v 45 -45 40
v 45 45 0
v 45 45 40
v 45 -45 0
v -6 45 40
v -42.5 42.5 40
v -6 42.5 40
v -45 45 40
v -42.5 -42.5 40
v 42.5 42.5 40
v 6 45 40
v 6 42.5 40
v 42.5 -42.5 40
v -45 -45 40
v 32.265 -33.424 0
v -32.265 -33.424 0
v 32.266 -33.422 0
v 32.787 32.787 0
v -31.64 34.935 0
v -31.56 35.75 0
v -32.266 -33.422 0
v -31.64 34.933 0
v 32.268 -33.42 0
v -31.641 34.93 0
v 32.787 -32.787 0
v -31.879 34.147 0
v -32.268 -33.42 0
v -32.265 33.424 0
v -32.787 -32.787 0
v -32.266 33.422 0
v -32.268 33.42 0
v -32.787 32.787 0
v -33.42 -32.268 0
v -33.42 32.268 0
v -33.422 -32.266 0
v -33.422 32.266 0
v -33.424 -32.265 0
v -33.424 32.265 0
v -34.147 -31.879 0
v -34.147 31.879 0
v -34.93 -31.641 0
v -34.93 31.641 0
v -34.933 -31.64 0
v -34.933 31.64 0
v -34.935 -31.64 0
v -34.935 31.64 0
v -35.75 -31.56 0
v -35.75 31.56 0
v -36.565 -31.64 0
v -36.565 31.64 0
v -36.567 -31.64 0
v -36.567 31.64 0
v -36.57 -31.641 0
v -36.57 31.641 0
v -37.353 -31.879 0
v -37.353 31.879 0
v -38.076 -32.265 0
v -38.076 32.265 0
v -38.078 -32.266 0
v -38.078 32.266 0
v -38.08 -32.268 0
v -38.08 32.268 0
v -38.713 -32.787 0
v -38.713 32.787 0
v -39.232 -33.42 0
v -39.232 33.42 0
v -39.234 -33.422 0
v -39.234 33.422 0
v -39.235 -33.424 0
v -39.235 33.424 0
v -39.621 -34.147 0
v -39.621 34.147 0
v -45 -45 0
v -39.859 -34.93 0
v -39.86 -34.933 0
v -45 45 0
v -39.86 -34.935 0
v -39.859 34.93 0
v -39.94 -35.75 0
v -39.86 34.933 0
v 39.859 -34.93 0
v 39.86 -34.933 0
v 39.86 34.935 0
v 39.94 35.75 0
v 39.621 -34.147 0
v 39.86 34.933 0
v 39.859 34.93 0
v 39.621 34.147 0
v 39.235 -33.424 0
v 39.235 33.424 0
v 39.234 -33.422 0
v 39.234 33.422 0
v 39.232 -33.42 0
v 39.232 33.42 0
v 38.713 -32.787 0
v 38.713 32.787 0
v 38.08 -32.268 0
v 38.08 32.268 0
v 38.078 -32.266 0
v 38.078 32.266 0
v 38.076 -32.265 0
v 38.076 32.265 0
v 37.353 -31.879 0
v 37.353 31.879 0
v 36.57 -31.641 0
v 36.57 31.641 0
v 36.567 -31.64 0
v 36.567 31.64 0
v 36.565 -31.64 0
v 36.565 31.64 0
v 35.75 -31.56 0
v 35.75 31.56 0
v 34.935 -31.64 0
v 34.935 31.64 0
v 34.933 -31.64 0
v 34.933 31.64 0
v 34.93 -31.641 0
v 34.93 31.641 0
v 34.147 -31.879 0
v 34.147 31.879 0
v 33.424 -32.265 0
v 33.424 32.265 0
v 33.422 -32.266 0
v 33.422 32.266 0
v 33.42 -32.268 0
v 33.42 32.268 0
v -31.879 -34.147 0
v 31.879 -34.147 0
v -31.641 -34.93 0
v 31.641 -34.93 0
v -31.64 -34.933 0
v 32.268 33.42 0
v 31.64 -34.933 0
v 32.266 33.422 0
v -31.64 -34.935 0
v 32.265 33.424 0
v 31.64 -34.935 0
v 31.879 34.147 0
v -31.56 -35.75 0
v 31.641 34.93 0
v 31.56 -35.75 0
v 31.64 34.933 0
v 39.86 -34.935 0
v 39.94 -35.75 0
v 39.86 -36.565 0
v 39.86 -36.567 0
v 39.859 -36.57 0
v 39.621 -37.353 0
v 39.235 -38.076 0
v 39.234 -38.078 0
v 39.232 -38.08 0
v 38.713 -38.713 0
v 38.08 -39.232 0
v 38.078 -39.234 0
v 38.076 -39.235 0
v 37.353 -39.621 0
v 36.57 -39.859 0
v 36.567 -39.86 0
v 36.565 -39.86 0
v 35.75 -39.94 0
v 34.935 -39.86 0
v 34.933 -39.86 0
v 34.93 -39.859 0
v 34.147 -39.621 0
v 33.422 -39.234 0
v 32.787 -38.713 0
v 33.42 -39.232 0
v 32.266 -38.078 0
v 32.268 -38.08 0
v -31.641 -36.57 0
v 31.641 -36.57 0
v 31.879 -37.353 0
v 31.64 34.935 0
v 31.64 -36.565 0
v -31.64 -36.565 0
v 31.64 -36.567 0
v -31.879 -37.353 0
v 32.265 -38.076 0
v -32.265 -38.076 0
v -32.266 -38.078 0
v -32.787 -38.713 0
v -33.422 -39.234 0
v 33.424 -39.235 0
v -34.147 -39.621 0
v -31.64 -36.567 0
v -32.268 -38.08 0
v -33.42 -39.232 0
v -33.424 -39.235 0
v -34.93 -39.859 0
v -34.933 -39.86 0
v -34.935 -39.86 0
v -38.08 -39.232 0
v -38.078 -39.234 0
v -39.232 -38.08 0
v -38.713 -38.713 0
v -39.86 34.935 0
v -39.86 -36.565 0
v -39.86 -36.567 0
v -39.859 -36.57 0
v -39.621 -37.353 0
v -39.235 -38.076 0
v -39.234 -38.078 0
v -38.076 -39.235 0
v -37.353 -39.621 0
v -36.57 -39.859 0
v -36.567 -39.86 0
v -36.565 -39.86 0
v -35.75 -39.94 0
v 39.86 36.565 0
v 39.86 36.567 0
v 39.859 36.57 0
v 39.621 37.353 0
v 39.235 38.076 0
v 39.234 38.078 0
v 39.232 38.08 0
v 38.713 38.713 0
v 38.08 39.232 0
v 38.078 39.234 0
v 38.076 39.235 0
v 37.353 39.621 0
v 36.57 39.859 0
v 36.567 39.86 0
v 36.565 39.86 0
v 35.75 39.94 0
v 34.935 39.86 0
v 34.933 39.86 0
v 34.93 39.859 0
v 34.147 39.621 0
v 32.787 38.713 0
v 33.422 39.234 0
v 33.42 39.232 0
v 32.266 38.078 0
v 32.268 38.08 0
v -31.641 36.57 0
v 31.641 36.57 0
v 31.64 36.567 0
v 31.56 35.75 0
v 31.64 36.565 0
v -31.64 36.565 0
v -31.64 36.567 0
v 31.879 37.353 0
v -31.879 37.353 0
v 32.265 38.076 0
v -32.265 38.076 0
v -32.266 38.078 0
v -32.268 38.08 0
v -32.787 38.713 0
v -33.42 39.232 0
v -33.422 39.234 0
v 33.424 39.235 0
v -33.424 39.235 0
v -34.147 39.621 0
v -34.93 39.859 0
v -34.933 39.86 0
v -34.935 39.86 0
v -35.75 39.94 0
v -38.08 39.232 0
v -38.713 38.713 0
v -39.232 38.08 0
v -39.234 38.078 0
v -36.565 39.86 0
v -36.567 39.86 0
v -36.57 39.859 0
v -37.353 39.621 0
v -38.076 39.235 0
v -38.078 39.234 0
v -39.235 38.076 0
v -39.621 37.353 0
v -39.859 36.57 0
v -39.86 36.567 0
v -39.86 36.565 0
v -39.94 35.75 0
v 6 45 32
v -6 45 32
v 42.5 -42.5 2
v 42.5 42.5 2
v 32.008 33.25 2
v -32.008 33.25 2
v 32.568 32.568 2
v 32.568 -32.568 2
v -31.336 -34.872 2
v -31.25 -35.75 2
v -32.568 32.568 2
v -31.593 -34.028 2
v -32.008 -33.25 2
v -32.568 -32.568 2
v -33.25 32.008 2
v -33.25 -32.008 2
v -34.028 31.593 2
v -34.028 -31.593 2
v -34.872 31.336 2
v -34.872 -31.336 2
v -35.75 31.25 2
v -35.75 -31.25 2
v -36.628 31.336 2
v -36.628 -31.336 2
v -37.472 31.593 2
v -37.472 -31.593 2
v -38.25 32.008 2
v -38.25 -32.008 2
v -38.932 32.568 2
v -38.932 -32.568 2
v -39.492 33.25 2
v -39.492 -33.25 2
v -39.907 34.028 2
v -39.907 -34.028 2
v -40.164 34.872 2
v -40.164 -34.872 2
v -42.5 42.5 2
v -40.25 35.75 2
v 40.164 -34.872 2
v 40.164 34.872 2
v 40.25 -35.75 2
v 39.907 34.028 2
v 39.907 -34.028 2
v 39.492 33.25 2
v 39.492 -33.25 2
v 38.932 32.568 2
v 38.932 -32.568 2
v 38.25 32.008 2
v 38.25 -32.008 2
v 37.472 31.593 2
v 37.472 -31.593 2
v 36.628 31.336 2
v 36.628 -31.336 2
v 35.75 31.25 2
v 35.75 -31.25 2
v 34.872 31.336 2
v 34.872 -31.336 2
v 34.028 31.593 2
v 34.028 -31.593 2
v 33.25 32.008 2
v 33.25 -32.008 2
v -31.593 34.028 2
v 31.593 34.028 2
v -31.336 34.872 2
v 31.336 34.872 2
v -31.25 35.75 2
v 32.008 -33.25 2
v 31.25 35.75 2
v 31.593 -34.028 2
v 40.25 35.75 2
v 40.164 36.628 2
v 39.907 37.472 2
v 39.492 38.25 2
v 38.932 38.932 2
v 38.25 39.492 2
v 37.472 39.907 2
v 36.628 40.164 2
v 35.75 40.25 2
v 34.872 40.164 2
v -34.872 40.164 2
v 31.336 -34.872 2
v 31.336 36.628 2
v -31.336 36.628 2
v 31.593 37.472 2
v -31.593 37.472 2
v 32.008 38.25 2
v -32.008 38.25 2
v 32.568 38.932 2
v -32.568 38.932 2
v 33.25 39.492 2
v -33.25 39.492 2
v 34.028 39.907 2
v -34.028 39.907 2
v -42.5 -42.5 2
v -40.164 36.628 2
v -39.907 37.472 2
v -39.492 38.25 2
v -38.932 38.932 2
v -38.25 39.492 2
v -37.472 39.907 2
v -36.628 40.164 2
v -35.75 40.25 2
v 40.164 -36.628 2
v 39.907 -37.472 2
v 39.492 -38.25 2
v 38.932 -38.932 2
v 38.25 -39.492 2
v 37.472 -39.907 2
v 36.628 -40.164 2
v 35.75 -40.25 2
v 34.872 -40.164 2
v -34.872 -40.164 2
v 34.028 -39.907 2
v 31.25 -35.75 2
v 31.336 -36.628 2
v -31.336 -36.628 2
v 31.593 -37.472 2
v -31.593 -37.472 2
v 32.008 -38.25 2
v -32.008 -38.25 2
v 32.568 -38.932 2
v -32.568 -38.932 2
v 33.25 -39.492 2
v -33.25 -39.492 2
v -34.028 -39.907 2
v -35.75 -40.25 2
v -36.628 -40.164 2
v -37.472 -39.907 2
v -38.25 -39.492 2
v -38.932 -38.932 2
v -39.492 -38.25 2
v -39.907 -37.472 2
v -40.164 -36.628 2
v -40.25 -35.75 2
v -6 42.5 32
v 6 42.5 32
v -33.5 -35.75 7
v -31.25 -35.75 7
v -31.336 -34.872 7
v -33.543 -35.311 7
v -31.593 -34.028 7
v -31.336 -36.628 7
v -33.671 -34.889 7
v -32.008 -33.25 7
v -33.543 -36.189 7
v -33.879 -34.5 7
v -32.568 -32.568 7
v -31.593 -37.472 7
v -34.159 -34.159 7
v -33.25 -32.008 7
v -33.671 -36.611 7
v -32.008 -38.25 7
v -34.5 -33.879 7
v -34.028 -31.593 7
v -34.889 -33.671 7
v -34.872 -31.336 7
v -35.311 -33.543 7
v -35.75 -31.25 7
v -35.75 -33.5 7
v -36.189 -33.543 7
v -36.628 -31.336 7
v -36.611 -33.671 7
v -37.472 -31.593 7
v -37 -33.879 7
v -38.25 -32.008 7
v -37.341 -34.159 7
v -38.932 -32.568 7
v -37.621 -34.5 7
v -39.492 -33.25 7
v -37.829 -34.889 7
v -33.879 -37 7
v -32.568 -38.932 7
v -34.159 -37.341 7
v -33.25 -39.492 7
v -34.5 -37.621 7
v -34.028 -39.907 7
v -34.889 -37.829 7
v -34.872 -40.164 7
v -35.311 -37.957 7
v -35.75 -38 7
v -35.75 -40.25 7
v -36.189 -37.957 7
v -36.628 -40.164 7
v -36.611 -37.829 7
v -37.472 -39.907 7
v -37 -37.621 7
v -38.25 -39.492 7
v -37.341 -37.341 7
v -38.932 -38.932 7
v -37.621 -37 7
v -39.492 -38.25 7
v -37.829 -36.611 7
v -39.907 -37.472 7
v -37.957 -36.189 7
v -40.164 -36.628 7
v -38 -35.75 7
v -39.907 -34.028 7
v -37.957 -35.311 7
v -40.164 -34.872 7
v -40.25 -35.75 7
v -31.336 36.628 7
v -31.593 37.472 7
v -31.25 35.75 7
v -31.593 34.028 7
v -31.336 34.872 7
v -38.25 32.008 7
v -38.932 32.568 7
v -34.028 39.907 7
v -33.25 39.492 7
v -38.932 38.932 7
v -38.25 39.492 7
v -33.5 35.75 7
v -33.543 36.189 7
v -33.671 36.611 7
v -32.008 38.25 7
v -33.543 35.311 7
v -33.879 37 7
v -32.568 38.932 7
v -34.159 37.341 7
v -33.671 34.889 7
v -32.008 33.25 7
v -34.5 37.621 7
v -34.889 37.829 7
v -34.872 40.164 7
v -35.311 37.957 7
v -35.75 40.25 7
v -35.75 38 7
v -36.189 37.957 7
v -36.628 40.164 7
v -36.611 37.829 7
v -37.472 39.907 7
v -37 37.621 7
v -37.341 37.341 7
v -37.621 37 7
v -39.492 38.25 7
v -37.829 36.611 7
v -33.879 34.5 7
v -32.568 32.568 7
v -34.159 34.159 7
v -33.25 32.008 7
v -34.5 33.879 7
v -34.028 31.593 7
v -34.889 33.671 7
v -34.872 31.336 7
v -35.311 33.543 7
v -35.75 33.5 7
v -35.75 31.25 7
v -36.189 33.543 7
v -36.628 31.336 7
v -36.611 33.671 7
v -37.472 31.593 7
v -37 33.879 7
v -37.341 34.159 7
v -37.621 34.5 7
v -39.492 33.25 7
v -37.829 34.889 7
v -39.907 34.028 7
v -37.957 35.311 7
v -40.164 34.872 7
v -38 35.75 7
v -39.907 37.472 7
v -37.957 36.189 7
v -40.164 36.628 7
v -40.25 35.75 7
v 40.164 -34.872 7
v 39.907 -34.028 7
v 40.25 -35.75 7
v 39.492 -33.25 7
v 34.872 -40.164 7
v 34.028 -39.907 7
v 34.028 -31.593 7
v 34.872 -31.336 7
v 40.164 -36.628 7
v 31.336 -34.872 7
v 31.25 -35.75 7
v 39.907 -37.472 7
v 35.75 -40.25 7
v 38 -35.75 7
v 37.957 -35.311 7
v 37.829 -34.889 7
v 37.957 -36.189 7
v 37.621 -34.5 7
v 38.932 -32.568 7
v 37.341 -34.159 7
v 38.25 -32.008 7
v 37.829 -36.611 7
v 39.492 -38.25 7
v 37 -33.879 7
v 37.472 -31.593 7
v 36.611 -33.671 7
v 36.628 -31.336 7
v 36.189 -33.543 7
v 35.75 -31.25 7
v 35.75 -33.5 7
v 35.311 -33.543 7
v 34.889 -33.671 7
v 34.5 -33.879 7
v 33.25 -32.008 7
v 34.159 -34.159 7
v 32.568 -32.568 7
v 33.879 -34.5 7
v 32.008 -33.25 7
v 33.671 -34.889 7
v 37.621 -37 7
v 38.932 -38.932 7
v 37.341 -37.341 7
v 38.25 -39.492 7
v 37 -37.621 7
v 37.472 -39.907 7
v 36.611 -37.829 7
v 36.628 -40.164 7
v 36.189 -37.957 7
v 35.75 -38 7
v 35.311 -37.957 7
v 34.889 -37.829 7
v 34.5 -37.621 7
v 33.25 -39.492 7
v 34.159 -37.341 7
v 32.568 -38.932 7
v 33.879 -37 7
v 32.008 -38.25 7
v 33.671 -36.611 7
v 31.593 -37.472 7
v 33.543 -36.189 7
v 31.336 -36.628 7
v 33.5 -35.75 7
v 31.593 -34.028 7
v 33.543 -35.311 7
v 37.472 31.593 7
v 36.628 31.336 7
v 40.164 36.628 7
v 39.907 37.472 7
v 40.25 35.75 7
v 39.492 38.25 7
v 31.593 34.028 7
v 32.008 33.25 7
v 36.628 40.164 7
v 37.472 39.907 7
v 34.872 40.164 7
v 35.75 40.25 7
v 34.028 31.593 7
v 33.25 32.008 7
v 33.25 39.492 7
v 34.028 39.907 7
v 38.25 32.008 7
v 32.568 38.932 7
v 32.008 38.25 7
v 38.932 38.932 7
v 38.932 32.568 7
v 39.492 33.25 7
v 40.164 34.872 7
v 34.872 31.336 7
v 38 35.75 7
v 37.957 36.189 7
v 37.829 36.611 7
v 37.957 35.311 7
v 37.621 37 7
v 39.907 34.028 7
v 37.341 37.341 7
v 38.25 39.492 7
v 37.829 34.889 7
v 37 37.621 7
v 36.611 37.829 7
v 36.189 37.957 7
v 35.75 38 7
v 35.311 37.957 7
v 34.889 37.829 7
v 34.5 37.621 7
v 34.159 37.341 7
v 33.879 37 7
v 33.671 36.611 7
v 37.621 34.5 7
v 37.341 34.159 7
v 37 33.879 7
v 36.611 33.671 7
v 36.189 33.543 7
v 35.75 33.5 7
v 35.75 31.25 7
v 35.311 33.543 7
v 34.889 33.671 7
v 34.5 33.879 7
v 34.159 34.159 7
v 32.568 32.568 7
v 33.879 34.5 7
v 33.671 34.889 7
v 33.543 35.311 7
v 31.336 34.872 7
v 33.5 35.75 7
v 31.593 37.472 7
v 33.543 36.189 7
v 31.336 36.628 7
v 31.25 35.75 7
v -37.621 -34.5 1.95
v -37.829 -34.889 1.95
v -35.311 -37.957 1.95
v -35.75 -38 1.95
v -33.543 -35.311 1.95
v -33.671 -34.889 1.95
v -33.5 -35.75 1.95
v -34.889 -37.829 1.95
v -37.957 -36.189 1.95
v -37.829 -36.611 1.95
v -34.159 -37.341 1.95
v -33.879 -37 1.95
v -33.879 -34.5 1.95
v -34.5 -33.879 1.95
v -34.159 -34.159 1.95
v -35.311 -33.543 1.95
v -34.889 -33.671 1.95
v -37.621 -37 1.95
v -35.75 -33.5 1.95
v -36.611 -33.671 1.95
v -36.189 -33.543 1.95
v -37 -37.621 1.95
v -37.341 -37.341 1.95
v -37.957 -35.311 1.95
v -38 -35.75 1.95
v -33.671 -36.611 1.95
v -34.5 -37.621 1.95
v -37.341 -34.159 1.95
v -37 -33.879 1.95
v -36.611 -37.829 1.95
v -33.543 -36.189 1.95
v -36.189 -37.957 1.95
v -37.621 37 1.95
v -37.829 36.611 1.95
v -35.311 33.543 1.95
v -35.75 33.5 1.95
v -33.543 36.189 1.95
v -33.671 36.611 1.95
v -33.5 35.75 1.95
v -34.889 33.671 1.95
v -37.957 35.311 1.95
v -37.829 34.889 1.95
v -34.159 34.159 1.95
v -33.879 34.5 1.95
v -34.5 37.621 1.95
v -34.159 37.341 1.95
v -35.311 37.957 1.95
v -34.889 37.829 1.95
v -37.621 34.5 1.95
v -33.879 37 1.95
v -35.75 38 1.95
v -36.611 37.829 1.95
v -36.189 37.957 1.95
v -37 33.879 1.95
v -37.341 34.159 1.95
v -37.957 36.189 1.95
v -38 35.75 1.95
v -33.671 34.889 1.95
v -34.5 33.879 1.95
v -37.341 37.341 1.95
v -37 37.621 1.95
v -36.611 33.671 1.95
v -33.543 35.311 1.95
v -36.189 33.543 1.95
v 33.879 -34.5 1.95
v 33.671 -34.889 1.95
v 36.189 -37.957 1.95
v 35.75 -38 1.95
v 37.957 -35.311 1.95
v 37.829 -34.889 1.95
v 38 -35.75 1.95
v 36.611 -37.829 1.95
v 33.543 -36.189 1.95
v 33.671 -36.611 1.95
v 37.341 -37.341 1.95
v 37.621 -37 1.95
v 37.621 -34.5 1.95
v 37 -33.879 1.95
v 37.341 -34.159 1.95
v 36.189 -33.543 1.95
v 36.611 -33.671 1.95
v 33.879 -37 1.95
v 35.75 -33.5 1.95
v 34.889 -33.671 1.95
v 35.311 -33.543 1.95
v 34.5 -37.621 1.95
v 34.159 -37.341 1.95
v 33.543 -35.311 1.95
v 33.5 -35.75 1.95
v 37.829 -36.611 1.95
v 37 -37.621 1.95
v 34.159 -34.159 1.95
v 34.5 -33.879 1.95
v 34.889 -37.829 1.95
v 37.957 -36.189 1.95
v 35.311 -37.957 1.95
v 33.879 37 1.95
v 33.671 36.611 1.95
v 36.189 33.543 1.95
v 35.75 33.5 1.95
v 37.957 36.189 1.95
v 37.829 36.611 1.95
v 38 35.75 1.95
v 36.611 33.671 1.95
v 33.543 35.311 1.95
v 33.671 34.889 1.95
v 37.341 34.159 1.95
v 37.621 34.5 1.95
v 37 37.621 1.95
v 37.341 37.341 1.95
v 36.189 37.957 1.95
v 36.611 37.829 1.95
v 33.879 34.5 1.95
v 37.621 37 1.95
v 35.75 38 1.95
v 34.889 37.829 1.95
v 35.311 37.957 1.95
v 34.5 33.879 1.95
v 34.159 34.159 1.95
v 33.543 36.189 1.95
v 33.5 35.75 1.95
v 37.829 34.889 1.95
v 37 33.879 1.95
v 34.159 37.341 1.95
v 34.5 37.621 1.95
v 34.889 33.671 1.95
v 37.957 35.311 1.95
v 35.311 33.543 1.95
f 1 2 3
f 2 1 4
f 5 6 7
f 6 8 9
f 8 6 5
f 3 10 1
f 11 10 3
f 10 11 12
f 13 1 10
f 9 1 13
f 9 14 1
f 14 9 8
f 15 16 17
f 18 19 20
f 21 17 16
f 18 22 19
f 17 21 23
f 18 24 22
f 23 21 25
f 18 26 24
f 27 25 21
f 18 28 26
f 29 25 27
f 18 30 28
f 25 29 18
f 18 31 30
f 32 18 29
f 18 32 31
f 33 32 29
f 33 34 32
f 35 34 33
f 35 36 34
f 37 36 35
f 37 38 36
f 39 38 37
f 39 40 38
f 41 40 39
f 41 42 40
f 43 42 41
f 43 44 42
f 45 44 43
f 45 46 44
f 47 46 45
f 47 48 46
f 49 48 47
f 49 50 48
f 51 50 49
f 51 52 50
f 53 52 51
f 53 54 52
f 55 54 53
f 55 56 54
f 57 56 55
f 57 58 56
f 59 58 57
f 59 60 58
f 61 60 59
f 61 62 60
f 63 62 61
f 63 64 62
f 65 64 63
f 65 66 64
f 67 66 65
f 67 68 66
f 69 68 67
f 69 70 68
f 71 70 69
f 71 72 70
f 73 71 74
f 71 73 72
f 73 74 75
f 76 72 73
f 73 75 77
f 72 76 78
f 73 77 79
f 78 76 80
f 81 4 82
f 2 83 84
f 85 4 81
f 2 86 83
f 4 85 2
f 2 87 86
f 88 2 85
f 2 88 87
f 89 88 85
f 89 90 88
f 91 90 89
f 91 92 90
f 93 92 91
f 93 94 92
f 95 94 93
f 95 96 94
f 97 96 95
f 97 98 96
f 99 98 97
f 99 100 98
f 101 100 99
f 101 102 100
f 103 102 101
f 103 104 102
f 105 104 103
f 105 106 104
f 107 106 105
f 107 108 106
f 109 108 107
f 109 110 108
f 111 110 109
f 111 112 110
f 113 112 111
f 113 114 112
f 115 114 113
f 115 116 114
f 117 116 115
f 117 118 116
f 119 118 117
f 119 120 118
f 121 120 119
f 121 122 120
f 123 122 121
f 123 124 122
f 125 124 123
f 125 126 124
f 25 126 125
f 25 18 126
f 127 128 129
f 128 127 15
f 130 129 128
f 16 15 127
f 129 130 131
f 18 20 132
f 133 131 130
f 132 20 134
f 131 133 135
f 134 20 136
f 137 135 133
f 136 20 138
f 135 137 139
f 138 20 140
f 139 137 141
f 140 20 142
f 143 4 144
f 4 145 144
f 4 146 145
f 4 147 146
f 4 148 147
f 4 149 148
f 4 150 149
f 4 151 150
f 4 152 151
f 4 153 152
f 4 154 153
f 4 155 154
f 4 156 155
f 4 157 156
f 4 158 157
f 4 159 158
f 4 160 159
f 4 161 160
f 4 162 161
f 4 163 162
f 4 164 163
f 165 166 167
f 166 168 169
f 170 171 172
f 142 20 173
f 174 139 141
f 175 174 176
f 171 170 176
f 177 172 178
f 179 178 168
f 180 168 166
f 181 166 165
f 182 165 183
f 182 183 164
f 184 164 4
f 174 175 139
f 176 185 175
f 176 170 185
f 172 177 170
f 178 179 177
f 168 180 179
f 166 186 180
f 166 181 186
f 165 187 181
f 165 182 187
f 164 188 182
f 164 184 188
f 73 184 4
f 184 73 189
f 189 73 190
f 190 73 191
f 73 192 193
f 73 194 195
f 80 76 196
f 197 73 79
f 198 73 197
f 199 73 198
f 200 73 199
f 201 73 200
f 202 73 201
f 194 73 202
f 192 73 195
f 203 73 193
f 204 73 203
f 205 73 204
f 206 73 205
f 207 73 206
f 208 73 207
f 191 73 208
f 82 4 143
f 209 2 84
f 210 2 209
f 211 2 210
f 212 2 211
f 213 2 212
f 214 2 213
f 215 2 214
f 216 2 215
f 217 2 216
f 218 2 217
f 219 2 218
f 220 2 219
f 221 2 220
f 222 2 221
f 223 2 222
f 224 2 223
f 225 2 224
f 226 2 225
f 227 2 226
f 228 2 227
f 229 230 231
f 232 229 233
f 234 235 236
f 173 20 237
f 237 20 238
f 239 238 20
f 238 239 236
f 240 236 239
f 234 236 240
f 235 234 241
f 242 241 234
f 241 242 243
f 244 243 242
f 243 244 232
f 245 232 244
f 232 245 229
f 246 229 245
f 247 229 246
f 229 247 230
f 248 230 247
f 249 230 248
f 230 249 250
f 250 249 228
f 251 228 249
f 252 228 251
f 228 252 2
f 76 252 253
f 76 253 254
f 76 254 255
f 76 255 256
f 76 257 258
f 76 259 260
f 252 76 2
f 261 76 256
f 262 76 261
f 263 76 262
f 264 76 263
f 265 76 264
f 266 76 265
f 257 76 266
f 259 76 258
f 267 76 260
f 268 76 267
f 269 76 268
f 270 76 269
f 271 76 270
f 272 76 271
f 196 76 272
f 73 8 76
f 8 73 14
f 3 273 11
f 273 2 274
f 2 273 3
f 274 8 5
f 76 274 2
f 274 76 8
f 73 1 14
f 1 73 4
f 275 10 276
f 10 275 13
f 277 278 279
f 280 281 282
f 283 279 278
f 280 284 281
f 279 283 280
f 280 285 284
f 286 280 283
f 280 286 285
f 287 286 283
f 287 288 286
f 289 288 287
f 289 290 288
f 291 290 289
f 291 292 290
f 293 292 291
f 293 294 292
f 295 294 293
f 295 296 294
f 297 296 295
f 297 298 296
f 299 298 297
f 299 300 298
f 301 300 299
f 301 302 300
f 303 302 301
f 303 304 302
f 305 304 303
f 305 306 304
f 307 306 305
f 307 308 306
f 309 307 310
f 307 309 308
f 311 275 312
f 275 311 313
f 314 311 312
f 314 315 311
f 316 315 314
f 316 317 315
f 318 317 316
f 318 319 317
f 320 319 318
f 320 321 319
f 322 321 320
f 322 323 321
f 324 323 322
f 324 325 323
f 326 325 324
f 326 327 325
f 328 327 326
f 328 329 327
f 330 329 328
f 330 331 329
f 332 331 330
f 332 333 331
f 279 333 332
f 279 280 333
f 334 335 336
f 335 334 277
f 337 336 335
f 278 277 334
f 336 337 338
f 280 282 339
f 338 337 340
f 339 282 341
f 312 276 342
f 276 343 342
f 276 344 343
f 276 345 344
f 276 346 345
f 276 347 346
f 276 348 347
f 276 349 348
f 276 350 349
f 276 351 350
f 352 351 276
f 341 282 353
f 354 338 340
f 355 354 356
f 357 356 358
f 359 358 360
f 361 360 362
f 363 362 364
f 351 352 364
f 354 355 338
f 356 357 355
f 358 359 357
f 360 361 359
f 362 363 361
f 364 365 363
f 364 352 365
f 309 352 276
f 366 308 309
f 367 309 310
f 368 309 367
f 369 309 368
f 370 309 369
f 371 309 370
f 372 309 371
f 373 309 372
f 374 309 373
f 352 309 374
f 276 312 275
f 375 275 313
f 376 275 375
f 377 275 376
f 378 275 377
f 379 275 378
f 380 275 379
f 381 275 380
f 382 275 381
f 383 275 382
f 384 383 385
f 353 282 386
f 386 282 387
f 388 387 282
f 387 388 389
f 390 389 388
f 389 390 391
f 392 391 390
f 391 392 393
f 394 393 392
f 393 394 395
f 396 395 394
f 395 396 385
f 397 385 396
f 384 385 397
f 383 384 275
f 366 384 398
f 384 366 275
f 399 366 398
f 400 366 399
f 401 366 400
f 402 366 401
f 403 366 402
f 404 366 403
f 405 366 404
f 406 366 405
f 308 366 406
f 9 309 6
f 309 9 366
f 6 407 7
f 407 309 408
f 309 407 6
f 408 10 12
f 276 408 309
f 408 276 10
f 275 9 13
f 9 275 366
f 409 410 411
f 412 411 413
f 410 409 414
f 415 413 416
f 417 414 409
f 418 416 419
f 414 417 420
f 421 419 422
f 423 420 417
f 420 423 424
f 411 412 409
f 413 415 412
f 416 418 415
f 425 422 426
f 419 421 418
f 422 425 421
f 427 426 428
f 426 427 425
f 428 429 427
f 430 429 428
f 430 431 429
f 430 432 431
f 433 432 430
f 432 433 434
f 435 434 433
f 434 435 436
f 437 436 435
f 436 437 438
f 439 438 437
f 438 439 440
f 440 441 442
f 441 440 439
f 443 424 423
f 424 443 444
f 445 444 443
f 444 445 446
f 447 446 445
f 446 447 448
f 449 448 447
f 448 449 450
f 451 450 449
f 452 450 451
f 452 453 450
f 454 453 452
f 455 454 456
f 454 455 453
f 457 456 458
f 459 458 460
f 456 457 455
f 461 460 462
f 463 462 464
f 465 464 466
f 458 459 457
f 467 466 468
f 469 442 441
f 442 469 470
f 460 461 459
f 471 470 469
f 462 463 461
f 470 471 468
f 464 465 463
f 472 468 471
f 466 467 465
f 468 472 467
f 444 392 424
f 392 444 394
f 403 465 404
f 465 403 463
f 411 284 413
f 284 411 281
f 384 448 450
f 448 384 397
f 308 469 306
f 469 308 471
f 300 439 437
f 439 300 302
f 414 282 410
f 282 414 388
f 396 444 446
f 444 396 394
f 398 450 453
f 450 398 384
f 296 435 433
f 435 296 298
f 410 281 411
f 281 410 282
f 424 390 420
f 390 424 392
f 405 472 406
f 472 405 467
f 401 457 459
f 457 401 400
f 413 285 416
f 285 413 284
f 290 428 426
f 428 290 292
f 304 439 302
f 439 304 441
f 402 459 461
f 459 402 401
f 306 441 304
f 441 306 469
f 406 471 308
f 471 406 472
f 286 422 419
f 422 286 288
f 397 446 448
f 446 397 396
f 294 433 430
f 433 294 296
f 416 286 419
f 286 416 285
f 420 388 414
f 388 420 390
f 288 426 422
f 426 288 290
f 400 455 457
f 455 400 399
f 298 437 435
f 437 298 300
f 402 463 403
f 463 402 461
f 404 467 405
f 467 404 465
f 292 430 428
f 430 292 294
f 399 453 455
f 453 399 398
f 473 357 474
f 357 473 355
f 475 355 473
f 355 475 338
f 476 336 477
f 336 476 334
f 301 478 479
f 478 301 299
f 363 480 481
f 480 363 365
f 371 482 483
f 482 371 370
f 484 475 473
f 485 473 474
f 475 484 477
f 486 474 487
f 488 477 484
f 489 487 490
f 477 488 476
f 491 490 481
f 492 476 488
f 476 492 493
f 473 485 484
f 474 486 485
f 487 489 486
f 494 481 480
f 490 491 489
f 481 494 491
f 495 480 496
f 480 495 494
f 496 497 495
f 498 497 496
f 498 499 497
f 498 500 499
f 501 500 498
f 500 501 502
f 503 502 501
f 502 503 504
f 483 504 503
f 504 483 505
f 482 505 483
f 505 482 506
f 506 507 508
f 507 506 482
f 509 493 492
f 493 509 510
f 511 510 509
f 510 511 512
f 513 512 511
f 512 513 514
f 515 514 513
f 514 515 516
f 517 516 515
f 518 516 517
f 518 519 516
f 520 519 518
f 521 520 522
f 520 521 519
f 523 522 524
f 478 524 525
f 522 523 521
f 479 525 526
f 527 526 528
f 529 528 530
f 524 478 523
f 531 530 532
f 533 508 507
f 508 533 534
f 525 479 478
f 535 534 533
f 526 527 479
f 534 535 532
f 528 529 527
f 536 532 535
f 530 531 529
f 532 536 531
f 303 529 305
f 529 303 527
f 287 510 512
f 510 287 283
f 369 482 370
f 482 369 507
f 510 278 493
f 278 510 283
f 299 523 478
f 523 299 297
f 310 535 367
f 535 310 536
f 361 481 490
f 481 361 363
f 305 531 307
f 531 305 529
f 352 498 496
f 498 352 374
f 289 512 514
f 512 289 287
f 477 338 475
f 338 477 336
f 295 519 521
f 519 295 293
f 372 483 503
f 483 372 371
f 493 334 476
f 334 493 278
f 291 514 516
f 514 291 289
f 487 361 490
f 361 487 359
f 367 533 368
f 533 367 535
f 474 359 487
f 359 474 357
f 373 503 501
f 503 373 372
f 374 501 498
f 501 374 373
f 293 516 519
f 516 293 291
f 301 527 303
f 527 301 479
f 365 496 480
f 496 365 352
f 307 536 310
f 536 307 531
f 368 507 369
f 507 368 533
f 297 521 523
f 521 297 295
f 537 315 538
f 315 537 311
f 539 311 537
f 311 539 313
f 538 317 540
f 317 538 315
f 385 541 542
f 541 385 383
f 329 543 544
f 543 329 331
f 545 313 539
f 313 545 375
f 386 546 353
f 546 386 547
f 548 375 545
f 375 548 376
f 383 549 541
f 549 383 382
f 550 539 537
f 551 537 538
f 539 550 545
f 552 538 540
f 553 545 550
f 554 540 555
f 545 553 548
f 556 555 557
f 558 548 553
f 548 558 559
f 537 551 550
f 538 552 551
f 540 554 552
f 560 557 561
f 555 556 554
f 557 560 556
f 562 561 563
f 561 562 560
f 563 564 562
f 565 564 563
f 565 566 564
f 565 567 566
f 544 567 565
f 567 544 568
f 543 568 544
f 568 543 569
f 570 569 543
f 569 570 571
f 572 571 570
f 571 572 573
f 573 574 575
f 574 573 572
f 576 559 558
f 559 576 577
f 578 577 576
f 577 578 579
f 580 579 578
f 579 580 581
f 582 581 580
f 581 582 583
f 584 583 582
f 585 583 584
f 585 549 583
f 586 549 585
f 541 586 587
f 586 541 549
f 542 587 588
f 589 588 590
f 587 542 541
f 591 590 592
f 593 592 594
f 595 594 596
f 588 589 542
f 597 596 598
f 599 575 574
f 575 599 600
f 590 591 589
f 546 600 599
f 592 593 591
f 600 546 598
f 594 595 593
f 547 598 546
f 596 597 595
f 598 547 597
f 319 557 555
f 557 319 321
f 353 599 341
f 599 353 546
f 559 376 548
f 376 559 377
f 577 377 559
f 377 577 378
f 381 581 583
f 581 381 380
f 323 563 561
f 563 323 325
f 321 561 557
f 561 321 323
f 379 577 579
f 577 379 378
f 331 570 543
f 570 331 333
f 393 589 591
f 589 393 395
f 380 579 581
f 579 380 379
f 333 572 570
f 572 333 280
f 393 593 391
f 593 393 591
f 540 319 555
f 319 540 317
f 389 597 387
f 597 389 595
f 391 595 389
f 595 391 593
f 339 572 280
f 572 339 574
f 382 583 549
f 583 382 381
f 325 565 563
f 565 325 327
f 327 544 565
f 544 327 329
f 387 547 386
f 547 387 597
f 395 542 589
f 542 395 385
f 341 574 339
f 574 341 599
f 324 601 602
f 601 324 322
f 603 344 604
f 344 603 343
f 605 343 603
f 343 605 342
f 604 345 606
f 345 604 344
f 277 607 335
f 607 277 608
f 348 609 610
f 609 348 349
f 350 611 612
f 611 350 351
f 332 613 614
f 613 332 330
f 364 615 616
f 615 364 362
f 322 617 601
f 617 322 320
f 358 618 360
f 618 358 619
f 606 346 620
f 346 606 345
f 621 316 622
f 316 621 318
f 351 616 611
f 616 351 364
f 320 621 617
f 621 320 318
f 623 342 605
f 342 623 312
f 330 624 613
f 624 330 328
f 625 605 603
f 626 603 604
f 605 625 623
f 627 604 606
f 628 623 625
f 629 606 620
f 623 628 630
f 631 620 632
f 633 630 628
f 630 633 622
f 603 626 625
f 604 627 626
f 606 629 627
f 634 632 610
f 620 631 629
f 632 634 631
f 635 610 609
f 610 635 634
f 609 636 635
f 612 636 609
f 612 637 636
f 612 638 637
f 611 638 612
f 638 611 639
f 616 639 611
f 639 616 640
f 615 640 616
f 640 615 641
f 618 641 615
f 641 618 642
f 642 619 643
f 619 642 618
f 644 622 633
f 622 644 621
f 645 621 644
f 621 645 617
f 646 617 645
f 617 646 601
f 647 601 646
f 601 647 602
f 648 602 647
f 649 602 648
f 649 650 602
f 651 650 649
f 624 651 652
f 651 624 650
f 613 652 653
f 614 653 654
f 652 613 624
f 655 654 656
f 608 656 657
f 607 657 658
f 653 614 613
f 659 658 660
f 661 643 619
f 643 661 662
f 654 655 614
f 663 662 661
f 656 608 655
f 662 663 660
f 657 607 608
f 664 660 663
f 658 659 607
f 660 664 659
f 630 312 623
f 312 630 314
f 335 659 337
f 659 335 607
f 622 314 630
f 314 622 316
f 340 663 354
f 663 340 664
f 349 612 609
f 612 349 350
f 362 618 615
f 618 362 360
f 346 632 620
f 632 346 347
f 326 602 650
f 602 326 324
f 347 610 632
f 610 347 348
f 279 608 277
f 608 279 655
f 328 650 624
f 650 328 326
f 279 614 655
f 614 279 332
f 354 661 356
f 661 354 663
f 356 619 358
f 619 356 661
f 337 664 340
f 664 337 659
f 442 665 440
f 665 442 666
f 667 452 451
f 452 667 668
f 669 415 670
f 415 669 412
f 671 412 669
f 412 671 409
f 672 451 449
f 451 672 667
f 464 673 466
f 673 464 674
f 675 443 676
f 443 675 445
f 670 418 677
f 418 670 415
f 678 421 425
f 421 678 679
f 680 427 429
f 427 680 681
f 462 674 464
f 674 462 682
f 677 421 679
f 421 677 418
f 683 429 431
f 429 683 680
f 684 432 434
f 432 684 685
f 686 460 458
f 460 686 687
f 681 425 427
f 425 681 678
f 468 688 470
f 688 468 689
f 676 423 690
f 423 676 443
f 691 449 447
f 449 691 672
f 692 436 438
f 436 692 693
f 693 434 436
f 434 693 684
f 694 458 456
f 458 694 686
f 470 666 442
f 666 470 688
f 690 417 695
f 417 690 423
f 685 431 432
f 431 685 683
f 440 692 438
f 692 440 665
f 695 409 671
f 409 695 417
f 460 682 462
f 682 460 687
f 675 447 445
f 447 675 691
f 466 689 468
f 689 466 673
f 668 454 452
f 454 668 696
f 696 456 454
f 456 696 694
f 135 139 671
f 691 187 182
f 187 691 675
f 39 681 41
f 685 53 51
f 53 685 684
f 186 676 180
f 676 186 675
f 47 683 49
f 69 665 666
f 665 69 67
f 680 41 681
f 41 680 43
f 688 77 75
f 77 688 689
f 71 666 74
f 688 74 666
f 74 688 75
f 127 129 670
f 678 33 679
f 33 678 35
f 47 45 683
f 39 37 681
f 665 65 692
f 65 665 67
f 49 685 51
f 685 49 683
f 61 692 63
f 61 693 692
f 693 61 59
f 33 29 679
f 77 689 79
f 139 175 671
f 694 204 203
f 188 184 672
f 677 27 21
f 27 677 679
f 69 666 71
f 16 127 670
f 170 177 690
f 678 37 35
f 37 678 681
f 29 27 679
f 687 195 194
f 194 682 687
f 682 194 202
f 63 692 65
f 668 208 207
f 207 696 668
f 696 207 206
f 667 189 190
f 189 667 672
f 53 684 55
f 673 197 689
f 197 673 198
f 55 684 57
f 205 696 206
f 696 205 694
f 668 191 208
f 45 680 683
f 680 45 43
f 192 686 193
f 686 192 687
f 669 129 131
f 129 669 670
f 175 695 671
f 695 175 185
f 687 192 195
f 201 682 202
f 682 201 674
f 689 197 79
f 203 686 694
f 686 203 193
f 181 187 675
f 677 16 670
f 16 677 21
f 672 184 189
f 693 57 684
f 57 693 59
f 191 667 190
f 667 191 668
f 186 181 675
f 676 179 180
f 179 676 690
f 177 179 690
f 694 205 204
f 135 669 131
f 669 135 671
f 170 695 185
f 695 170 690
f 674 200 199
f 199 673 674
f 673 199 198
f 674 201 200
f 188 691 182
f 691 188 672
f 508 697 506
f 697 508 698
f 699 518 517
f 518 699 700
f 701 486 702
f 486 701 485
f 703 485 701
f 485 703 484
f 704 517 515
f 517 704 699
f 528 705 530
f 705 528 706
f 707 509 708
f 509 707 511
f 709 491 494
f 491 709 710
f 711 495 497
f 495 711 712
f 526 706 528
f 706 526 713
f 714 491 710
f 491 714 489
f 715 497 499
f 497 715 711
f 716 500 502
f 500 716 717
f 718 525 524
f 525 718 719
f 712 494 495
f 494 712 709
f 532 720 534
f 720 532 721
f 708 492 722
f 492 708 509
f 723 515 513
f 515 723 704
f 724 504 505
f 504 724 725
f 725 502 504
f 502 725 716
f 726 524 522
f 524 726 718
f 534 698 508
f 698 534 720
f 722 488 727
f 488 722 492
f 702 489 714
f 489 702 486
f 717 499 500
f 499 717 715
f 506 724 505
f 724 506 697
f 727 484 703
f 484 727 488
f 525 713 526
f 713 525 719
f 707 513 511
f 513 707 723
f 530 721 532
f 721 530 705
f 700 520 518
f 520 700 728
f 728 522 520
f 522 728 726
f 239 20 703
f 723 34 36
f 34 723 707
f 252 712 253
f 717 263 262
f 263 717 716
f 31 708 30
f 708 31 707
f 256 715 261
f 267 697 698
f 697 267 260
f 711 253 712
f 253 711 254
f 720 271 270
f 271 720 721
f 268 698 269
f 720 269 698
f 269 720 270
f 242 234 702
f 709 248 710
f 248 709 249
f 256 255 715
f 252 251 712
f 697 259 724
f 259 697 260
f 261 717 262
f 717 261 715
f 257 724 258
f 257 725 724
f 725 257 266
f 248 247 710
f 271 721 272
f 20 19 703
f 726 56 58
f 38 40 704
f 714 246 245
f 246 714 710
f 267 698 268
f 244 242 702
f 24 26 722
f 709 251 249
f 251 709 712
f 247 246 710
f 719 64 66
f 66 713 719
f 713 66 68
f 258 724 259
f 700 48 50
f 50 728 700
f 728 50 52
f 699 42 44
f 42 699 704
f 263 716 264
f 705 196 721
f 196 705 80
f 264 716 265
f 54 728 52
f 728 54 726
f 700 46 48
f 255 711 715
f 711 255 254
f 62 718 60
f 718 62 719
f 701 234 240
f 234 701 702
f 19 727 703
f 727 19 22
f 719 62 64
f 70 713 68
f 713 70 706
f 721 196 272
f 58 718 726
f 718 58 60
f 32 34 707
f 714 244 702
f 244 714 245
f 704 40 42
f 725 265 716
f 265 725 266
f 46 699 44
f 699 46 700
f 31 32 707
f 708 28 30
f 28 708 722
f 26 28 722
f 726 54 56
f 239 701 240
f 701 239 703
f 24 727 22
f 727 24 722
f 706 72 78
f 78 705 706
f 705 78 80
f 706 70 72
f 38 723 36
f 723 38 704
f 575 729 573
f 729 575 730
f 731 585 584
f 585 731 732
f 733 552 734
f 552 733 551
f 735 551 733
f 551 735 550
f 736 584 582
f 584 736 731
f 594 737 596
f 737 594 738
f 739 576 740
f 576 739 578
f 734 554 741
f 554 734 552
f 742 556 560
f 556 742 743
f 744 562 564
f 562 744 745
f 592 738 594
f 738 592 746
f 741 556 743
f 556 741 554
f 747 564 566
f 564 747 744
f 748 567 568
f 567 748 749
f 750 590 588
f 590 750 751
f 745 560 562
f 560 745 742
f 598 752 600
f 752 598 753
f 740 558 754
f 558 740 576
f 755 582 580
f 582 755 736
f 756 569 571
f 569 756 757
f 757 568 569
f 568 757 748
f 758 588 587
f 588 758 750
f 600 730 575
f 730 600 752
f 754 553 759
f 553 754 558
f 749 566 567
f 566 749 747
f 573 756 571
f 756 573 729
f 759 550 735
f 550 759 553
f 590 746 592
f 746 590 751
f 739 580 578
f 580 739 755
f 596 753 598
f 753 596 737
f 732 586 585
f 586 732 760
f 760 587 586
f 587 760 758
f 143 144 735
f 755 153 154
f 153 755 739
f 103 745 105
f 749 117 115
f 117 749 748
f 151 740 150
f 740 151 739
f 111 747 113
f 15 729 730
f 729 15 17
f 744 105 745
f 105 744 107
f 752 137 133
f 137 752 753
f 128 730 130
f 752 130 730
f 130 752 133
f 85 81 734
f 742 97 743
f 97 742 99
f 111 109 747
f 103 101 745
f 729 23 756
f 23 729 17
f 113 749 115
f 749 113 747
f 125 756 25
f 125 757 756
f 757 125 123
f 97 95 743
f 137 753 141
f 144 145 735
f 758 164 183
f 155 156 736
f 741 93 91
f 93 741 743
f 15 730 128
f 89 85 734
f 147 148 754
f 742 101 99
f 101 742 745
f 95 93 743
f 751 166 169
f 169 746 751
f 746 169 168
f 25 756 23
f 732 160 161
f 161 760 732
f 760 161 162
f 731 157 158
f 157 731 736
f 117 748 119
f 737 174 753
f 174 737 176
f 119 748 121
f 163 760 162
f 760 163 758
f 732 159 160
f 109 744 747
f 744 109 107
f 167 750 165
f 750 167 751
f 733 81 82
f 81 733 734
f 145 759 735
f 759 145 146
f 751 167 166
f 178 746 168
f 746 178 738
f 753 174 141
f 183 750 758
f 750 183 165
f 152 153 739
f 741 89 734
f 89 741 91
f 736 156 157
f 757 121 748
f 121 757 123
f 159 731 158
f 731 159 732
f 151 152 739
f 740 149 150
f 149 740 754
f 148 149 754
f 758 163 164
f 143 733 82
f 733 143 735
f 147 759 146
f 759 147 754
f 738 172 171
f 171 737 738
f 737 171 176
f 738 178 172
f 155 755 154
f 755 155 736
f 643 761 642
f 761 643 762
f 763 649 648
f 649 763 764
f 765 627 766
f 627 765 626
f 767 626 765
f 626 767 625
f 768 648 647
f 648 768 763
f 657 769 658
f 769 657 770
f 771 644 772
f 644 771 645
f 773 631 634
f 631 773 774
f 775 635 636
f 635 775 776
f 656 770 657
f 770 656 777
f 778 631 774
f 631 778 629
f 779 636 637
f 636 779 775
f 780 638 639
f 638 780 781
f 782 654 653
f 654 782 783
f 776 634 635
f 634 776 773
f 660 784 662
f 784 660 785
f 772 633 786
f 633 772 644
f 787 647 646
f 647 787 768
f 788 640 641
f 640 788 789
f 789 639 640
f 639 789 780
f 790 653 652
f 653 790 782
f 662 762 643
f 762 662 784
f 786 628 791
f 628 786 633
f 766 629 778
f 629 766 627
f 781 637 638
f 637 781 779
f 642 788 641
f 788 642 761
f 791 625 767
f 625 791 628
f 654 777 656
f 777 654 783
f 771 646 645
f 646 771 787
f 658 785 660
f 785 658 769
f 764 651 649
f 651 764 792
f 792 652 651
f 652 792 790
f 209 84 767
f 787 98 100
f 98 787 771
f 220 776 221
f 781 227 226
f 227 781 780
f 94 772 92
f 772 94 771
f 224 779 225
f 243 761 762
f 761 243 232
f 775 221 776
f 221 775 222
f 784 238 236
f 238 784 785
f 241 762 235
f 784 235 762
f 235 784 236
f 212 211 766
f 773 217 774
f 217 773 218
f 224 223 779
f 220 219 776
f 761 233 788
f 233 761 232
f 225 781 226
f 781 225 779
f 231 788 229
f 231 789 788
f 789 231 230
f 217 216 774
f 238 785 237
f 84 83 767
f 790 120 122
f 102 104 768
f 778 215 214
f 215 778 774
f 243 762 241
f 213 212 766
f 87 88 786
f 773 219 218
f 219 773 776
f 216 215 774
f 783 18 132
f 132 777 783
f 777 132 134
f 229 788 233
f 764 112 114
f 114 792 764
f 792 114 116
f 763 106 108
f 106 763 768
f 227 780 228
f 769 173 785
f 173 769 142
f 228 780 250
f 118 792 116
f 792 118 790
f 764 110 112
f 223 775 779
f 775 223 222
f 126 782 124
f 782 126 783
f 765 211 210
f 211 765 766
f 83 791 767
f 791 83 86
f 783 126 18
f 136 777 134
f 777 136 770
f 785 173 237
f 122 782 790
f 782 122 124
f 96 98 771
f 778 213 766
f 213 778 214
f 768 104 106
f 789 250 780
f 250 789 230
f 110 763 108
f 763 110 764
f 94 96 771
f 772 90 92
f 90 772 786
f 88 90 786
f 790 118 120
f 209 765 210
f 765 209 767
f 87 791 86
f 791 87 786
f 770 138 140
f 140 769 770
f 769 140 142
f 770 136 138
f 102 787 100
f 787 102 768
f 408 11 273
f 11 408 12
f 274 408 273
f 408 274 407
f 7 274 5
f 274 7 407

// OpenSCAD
// Housing for a DIY magnetic stirrer built from an 80 mm PC fan
// Category: full hardware. Glue two magnets to the fan hub (opposite poles facing up,
// symmetric about the hub). The fan screws to four standoffs under the top plate, so
// the magnets clear the plate; countersunk M4 screws keep the stirring surface flat.
// Power: 12 V fan from a certified 12 V supply with a PWM speed controller. No mains.
// Keep loose neodymium magnets away from children and pacemakers.
// Modelled in print orientation: upside down, top plate on the bed.
// Print: PETG or PLA, 0.2 mm layers, 15 % infill.
// SPDX-License-Identifier: CERN-OHL-P-2.0

/* [Housing] */
// X, Y, height [mm]
outer = [90, 90, 40];
wall = 2.5; // 0.1
// stir surface; thin keeps magnets close to the stir bar
top_t = 2;
// M4 clearance
fan_hole_d = 4.5; // 0.1
// 80 mm fan mounting pattern
fan_hole_spacing = 71.5; // 0.1
// M4 flat head (ISO 10642), 90 deg
countersink_d = 8.4; // 0.1
// diameter, height: magnet thickness + ~1 mm
standoff = [9, 5];
// cable notch width x depth, from the open edge
notch = [12, 8];

/* [Hidden] */
$fn = 32;
eps = 0.01;

// parameter checks: stop with a message instead of building a broken part
assert(fan_hole_spacing + countersink_d <= outer.x - 2 * wall && fan_hole_spacing + countersink_d <= outer.y - 2 * wall, "the fan screw pattern does not fit inside the housing");
assert(wall >= 0.8 && top_t >= 0.8, "walls must be at least 0.8 mm (two perimeters)");

difference() {
    union() {
        difference() {
            translate([-outer.x / 2, -outer.y / 2, 0]) cube(outer);
            translate([-outer.x / 2 + wall, -outer.y / 2 + wall, top_t])
                cube([outer.x - 2 * wall, outer.y - 2 * wall, outer.z]);
        }
        for (sx = [-1, 1], sy = [-1, 1])
            translate([sx * fan_hole_spacing / 2, sy * fan_hole_spacing / 2, top_t - eps])
                cylinder(d = standoff[0], h = standoff[1] + eps);
    }
    for (sx = [-1, 1], sy = [-1, 1])
        translate([sx * fan_hole_spacing / 2, sy * fan_hole_spacing / 2, 0]) {
            translate([0, 0, -eps]) cylinder(d = fan_hole_d, h = top_t + standoff[1] + 2 * eps);
            // countersink opens on the bed face = the stirring surface in use
            translate([0, 0, -eps]) cylinder(d1 = countersink_d, d2 = fan_hole_d, h = (countersink_d - fan_hole_d) / 2 + eps);
        }
    translate([-notch.x / 2, outer.y / 2 - wall - 1, outer.z - notch.y])
        cube([notch.x, wall + 2, notch.y + eps]);
}
